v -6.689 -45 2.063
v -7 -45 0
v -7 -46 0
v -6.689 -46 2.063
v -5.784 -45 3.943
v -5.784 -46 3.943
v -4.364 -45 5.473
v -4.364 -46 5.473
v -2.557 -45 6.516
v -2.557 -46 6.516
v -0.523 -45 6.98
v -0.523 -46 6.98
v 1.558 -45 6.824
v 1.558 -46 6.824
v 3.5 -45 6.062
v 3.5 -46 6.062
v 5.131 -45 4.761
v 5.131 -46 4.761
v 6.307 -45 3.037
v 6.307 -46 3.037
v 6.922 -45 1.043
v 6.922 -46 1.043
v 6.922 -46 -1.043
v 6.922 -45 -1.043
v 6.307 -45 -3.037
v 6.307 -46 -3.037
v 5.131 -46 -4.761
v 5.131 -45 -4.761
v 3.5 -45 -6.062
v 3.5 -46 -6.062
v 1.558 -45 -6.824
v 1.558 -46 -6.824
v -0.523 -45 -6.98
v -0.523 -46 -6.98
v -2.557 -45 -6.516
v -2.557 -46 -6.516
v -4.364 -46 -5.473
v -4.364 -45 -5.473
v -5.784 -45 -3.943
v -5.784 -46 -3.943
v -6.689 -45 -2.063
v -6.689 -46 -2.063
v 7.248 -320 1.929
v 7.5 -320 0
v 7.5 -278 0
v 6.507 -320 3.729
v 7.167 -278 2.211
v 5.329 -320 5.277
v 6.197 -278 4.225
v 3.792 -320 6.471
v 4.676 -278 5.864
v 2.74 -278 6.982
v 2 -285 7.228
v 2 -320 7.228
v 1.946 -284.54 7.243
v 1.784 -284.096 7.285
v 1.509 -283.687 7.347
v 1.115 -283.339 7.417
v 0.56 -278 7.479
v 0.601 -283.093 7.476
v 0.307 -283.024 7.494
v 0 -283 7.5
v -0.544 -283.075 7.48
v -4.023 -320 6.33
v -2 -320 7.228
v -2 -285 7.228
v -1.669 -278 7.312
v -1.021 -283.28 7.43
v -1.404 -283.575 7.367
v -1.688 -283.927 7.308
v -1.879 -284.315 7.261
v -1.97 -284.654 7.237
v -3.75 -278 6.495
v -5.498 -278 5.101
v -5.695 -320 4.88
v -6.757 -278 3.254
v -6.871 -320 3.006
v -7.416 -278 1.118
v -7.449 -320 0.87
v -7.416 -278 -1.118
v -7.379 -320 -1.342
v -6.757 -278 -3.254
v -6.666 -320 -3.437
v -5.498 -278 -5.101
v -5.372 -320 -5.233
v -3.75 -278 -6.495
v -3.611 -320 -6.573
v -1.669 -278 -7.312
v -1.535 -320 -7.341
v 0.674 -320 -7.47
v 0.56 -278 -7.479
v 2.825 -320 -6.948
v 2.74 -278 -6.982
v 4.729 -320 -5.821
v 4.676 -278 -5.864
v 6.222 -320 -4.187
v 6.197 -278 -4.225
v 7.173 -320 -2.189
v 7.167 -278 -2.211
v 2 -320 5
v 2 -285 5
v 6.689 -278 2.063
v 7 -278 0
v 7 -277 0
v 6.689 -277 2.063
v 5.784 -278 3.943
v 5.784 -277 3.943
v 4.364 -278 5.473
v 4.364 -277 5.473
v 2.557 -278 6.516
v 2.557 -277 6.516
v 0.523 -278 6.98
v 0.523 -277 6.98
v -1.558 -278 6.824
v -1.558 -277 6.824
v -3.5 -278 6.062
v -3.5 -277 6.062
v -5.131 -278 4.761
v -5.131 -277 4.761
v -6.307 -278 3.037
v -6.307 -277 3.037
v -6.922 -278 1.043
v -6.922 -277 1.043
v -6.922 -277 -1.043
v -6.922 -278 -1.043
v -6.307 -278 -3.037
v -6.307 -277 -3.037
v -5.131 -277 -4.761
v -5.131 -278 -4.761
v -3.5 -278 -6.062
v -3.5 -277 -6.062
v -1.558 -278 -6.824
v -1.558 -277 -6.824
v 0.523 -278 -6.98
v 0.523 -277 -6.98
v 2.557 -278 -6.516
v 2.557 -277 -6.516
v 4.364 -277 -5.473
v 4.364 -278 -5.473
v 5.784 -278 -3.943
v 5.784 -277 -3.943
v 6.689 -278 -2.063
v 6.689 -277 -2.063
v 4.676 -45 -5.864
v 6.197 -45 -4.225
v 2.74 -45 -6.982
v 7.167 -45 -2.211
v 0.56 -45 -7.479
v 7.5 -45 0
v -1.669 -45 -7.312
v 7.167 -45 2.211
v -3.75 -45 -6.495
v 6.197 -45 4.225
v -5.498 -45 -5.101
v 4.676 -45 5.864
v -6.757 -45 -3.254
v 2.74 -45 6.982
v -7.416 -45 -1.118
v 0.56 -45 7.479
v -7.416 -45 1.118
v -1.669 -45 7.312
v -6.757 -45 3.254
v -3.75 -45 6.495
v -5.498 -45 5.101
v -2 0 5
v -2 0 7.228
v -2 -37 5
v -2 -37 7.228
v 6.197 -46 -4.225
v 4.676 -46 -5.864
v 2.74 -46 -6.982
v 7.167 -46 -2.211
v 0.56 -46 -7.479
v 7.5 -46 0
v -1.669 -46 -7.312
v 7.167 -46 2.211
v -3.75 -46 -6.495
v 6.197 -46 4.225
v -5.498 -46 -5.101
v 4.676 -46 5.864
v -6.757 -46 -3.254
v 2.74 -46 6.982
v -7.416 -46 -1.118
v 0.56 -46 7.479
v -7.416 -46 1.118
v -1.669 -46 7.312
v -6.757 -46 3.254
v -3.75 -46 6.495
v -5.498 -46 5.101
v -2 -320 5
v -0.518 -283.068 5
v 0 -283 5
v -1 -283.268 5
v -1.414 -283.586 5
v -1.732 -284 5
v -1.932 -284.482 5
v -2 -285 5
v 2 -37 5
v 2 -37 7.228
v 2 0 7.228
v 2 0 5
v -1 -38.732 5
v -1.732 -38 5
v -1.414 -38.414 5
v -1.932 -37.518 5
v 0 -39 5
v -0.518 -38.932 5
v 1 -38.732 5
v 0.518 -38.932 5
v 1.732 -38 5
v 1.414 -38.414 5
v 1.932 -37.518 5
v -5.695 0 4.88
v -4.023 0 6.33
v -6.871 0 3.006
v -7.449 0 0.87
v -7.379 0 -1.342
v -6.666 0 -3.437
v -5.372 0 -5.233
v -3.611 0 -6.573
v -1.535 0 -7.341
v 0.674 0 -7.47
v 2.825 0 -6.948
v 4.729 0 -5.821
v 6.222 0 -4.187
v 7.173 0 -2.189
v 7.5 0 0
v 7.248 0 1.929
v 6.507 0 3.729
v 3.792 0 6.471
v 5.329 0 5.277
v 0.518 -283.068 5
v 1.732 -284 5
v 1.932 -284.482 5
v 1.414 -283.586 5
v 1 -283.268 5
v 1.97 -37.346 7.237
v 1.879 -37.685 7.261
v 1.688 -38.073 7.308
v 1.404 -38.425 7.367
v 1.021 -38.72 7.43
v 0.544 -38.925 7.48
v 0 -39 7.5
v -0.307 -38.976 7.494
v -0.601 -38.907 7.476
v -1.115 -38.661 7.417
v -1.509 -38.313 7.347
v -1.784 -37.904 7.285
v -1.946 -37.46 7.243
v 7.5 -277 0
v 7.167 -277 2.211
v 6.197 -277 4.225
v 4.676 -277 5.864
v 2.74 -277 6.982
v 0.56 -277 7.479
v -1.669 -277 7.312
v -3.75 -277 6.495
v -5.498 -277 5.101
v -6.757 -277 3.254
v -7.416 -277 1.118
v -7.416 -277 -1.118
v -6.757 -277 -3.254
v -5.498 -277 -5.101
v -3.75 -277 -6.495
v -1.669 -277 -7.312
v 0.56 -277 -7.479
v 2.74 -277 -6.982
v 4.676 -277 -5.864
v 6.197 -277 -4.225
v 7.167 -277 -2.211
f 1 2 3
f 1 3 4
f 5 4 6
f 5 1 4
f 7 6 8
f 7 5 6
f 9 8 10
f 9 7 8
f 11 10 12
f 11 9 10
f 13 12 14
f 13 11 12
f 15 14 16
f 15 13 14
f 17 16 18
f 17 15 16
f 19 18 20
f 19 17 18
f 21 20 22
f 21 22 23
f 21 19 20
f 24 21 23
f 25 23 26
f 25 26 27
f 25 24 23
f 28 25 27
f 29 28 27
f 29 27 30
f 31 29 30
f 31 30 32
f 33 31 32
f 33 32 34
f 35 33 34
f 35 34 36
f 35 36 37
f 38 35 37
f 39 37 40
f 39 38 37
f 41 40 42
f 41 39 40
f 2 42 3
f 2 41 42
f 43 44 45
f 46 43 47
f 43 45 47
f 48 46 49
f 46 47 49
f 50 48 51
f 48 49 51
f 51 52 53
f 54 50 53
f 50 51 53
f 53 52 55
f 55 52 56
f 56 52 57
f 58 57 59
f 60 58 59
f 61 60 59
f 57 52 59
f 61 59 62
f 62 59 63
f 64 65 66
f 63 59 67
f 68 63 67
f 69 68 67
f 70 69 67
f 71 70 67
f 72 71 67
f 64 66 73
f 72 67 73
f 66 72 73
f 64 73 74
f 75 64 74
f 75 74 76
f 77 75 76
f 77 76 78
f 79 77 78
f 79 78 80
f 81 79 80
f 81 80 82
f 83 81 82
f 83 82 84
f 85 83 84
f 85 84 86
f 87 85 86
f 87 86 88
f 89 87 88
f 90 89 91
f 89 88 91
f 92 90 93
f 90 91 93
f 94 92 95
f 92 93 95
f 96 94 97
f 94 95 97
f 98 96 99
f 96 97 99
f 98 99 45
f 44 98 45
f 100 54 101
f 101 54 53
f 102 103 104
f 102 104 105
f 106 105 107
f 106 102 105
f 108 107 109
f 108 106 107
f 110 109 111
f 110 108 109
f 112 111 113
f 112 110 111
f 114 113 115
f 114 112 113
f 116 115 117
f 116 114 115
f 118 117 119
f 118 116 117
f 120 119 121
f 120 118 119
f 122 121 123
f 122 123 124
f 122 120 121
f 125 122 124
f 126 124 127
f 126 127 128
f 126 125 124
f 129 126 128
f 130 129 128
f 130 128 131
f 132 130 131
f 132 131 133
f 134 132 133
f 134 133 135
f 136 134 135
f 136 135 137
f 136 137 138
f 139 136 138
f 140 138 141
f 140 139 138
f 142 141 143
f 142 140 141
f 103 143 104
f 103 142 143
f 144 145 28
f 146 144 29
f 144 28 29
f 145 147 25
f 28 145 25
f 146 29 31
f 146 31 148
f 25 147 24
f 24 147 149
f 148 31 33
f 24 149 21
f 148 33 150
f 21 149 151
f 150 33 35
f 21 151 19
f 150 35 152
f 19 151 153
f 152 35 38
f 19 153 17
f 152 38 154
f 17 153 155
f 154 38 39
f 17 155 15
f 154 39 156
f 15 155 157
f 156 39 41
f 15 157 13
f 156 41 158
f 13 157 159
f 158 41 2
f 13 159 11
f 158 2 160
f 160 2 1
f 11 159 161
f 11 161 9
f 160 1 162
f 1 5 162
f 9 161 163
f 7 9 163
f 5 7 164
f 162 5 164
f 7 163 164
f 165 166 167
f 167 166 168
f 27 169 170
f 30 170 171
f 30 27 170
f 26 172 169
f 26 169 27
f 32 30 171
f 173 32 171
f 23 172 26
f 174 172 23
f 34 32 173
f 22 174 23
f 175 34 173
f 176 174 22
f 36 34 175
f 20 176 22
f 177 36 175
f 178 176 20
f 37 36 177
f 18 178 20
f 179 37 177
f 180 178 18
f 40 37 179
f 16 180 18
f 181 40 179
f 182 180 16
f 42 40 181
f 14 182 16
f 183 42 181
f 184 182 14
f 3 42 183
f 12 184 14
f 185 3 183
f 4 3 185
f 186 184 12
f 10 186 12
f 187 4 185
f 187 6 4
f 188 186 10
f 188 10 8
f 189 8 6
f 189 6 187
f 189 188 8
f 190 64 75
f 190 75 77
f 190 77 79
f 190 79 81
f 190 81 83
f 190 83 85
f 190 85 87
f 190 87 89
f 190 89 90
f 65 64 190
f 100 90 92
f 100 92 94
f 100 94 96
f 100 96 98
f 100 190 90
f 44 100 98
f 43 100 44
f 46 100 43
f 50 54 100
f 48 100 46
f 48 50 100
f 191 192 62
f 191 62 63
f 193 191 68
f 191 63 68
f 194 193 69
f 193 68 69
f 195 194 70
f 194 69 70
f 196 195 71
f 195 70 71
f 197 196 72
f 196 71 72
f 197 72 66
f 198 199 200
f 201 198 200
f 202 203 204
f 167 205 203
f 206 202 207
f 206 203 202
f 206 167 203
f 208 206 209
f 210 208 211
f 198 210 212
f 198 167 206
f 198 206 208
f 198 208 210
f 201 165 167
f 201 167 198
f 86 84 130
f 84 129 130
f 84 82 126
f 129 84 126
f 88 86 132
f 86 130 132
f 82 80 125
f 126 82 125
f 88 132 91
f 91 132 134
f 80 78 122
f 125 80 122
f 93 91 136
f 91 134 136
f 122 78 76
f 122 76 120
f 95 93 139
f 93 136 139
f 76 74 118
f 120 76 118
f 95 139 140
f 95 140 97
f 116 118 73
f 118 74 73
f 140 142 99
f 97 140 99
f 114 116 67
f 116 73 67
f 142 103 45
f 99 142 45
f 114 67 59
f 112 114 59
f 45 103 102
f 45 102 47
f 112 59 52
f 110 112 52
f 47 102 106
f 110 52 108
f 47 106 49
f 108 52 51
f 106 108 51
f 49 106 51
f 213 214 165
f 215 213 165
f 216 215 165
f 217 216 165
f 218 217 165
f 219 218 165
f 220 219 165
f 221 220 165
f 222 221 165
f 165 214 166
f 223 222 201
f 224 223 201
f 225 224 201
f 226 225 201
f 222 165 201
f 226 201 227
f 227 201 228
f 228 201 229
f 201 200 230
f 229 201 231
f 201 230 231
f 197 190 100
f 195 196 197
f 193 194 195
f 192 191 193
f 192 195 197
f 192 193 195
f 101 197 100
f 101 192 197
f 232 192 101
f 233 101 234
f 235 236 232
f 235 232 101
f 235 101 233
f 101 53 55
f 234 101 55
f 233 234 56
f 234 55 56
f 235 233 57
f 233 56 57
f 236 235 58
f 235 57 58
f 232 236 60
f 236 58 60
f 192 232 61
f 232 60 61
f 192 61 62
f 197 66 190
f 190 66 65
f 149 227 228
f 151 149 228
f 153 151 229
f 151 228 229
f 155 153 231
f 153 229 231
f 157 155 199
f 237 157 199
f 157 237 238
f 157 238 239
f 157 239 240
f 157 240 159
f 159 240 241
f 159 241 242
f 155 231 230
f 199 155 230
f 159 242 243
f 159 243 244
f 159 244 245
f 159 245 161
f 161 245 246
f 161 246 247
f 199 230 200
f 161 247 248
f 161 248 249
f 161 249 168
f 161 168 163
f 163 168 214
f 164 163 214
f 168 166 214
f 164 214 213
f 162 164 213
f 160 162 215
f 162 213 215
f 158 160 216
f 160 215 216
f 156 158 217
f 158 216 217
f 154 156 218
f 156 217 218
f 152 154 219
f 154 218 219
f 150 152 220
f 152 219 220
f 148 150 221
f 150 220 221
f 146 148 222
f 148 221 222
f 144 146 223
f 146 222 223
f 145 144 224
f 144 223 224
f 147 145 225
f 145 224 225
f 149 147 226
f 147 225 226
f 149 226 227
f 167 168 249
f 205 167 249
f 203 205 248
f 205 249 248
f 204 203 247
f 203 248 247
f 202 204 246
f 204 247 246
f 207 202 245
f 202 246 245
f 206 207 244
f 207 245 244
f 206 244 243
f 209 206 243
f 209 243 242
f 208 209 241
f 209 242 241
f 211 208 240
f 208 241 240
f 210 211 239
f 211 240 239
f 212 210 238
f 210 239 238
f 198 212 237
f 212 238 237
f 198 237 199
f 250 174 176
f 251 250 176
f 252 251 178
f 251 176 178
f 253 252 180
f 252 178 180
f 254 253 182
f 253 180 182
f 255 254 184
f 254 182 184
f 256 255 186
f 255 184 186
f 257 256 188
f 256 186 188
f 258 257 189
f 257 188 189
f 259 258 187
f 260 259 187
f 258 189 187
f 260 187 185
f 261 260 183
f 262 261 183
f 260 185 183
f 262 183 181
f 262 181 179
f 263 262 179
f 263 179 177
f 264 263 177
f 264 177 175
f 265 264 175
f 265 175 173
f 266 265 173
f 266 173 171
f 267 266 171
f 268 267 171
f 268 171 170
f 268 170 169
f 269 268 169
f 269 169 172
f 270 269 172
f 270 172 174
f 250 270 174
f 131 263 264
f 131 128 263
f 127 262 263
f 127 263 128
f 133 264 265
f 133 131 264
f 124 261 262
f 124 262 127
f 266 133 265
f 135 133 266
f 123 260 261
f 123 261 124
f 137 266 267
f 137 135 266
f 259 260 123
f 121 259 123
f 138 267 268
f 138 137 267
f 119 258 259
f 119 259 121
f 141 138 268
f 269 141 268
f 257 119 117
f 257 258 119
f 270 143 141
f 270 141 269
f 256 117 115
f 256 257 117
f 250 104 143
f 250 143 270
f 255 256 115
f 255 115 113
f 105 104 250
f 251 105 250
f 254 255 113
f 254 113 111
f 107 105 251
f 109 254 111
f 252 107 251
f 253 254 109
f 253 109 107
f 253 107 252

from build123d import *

# Parameters (mm, degrees)
F0_R      = 7.5
F1_DEPTH  = 320
F4_DEPTH  = 2.5
F6_R      = 7.5
F6_R_2    = 7
F7_DEPTH  = 1
F9_R      = 7.5
F9_R_2    = 7
F10_DEPTH = 1


with BuildPart() as f1:
    # F0 (on Front) → F1 (new body)
    with BuildSketch(Plane.XZ):
        Circle(F0_R)
    extrude(amount=F1_DEPTH)

    # F3 (on offset) → F4 (cut)
    with BuildSketch(Plane.XY.offset(7.5)):
        with BuildLine():
            Line((2, 0), (-2, 0))
            Line((-2, 0), (-2, -37))
            ThreePointArc((-2, -37), (-1.4142135624, -38.4142135624), (0, -39))
            ThreePointArc((0, -39), (1.4142135624, -38.4142135624), (2, -37))
            Line((2, -37), (2, 0))
        make_face()
        with BuildLine():
            Line((-2, -320), (2, -320))
            Line((2, -320), (2, -285))
            ThreePointArc((2, -285), (1.4142135624, -283.5857864376), (0, -283))
            ThreePointArc((0, -283), (-1.4142135624, -283.5857864376), (-2, -285))
            Line((-2, -285), (-2, -320))
        make_face()
    extrude(amount=-F4_DEPTH, mode=Mode.SUBTRACT)

    # F6 (on offset) → F7 (cut)
    with BuildSketch(Plane.XZ.offset(278)):
        Circle(F6_R)
        Circle(F6_R_2, mode=Mode.SUBTRACT)
    extrude(amount=-F7_DEPTH, mode=Mode.SUBTRACT)

    # F9 (on offset) → F10 (cut)
    with BuildSketch(Plane(origin=(0, -45, 0), x_dir=(-1, 0, 0), z_dir=(0, 1, 0))):
        Circle(F9_R)
        Circle(F9_R_2, mode=Mode.SUBTRACT)
    extrude(amount=-F10_DEPTH, mode=Mode.SUBTRACT)


solid = f1.part
